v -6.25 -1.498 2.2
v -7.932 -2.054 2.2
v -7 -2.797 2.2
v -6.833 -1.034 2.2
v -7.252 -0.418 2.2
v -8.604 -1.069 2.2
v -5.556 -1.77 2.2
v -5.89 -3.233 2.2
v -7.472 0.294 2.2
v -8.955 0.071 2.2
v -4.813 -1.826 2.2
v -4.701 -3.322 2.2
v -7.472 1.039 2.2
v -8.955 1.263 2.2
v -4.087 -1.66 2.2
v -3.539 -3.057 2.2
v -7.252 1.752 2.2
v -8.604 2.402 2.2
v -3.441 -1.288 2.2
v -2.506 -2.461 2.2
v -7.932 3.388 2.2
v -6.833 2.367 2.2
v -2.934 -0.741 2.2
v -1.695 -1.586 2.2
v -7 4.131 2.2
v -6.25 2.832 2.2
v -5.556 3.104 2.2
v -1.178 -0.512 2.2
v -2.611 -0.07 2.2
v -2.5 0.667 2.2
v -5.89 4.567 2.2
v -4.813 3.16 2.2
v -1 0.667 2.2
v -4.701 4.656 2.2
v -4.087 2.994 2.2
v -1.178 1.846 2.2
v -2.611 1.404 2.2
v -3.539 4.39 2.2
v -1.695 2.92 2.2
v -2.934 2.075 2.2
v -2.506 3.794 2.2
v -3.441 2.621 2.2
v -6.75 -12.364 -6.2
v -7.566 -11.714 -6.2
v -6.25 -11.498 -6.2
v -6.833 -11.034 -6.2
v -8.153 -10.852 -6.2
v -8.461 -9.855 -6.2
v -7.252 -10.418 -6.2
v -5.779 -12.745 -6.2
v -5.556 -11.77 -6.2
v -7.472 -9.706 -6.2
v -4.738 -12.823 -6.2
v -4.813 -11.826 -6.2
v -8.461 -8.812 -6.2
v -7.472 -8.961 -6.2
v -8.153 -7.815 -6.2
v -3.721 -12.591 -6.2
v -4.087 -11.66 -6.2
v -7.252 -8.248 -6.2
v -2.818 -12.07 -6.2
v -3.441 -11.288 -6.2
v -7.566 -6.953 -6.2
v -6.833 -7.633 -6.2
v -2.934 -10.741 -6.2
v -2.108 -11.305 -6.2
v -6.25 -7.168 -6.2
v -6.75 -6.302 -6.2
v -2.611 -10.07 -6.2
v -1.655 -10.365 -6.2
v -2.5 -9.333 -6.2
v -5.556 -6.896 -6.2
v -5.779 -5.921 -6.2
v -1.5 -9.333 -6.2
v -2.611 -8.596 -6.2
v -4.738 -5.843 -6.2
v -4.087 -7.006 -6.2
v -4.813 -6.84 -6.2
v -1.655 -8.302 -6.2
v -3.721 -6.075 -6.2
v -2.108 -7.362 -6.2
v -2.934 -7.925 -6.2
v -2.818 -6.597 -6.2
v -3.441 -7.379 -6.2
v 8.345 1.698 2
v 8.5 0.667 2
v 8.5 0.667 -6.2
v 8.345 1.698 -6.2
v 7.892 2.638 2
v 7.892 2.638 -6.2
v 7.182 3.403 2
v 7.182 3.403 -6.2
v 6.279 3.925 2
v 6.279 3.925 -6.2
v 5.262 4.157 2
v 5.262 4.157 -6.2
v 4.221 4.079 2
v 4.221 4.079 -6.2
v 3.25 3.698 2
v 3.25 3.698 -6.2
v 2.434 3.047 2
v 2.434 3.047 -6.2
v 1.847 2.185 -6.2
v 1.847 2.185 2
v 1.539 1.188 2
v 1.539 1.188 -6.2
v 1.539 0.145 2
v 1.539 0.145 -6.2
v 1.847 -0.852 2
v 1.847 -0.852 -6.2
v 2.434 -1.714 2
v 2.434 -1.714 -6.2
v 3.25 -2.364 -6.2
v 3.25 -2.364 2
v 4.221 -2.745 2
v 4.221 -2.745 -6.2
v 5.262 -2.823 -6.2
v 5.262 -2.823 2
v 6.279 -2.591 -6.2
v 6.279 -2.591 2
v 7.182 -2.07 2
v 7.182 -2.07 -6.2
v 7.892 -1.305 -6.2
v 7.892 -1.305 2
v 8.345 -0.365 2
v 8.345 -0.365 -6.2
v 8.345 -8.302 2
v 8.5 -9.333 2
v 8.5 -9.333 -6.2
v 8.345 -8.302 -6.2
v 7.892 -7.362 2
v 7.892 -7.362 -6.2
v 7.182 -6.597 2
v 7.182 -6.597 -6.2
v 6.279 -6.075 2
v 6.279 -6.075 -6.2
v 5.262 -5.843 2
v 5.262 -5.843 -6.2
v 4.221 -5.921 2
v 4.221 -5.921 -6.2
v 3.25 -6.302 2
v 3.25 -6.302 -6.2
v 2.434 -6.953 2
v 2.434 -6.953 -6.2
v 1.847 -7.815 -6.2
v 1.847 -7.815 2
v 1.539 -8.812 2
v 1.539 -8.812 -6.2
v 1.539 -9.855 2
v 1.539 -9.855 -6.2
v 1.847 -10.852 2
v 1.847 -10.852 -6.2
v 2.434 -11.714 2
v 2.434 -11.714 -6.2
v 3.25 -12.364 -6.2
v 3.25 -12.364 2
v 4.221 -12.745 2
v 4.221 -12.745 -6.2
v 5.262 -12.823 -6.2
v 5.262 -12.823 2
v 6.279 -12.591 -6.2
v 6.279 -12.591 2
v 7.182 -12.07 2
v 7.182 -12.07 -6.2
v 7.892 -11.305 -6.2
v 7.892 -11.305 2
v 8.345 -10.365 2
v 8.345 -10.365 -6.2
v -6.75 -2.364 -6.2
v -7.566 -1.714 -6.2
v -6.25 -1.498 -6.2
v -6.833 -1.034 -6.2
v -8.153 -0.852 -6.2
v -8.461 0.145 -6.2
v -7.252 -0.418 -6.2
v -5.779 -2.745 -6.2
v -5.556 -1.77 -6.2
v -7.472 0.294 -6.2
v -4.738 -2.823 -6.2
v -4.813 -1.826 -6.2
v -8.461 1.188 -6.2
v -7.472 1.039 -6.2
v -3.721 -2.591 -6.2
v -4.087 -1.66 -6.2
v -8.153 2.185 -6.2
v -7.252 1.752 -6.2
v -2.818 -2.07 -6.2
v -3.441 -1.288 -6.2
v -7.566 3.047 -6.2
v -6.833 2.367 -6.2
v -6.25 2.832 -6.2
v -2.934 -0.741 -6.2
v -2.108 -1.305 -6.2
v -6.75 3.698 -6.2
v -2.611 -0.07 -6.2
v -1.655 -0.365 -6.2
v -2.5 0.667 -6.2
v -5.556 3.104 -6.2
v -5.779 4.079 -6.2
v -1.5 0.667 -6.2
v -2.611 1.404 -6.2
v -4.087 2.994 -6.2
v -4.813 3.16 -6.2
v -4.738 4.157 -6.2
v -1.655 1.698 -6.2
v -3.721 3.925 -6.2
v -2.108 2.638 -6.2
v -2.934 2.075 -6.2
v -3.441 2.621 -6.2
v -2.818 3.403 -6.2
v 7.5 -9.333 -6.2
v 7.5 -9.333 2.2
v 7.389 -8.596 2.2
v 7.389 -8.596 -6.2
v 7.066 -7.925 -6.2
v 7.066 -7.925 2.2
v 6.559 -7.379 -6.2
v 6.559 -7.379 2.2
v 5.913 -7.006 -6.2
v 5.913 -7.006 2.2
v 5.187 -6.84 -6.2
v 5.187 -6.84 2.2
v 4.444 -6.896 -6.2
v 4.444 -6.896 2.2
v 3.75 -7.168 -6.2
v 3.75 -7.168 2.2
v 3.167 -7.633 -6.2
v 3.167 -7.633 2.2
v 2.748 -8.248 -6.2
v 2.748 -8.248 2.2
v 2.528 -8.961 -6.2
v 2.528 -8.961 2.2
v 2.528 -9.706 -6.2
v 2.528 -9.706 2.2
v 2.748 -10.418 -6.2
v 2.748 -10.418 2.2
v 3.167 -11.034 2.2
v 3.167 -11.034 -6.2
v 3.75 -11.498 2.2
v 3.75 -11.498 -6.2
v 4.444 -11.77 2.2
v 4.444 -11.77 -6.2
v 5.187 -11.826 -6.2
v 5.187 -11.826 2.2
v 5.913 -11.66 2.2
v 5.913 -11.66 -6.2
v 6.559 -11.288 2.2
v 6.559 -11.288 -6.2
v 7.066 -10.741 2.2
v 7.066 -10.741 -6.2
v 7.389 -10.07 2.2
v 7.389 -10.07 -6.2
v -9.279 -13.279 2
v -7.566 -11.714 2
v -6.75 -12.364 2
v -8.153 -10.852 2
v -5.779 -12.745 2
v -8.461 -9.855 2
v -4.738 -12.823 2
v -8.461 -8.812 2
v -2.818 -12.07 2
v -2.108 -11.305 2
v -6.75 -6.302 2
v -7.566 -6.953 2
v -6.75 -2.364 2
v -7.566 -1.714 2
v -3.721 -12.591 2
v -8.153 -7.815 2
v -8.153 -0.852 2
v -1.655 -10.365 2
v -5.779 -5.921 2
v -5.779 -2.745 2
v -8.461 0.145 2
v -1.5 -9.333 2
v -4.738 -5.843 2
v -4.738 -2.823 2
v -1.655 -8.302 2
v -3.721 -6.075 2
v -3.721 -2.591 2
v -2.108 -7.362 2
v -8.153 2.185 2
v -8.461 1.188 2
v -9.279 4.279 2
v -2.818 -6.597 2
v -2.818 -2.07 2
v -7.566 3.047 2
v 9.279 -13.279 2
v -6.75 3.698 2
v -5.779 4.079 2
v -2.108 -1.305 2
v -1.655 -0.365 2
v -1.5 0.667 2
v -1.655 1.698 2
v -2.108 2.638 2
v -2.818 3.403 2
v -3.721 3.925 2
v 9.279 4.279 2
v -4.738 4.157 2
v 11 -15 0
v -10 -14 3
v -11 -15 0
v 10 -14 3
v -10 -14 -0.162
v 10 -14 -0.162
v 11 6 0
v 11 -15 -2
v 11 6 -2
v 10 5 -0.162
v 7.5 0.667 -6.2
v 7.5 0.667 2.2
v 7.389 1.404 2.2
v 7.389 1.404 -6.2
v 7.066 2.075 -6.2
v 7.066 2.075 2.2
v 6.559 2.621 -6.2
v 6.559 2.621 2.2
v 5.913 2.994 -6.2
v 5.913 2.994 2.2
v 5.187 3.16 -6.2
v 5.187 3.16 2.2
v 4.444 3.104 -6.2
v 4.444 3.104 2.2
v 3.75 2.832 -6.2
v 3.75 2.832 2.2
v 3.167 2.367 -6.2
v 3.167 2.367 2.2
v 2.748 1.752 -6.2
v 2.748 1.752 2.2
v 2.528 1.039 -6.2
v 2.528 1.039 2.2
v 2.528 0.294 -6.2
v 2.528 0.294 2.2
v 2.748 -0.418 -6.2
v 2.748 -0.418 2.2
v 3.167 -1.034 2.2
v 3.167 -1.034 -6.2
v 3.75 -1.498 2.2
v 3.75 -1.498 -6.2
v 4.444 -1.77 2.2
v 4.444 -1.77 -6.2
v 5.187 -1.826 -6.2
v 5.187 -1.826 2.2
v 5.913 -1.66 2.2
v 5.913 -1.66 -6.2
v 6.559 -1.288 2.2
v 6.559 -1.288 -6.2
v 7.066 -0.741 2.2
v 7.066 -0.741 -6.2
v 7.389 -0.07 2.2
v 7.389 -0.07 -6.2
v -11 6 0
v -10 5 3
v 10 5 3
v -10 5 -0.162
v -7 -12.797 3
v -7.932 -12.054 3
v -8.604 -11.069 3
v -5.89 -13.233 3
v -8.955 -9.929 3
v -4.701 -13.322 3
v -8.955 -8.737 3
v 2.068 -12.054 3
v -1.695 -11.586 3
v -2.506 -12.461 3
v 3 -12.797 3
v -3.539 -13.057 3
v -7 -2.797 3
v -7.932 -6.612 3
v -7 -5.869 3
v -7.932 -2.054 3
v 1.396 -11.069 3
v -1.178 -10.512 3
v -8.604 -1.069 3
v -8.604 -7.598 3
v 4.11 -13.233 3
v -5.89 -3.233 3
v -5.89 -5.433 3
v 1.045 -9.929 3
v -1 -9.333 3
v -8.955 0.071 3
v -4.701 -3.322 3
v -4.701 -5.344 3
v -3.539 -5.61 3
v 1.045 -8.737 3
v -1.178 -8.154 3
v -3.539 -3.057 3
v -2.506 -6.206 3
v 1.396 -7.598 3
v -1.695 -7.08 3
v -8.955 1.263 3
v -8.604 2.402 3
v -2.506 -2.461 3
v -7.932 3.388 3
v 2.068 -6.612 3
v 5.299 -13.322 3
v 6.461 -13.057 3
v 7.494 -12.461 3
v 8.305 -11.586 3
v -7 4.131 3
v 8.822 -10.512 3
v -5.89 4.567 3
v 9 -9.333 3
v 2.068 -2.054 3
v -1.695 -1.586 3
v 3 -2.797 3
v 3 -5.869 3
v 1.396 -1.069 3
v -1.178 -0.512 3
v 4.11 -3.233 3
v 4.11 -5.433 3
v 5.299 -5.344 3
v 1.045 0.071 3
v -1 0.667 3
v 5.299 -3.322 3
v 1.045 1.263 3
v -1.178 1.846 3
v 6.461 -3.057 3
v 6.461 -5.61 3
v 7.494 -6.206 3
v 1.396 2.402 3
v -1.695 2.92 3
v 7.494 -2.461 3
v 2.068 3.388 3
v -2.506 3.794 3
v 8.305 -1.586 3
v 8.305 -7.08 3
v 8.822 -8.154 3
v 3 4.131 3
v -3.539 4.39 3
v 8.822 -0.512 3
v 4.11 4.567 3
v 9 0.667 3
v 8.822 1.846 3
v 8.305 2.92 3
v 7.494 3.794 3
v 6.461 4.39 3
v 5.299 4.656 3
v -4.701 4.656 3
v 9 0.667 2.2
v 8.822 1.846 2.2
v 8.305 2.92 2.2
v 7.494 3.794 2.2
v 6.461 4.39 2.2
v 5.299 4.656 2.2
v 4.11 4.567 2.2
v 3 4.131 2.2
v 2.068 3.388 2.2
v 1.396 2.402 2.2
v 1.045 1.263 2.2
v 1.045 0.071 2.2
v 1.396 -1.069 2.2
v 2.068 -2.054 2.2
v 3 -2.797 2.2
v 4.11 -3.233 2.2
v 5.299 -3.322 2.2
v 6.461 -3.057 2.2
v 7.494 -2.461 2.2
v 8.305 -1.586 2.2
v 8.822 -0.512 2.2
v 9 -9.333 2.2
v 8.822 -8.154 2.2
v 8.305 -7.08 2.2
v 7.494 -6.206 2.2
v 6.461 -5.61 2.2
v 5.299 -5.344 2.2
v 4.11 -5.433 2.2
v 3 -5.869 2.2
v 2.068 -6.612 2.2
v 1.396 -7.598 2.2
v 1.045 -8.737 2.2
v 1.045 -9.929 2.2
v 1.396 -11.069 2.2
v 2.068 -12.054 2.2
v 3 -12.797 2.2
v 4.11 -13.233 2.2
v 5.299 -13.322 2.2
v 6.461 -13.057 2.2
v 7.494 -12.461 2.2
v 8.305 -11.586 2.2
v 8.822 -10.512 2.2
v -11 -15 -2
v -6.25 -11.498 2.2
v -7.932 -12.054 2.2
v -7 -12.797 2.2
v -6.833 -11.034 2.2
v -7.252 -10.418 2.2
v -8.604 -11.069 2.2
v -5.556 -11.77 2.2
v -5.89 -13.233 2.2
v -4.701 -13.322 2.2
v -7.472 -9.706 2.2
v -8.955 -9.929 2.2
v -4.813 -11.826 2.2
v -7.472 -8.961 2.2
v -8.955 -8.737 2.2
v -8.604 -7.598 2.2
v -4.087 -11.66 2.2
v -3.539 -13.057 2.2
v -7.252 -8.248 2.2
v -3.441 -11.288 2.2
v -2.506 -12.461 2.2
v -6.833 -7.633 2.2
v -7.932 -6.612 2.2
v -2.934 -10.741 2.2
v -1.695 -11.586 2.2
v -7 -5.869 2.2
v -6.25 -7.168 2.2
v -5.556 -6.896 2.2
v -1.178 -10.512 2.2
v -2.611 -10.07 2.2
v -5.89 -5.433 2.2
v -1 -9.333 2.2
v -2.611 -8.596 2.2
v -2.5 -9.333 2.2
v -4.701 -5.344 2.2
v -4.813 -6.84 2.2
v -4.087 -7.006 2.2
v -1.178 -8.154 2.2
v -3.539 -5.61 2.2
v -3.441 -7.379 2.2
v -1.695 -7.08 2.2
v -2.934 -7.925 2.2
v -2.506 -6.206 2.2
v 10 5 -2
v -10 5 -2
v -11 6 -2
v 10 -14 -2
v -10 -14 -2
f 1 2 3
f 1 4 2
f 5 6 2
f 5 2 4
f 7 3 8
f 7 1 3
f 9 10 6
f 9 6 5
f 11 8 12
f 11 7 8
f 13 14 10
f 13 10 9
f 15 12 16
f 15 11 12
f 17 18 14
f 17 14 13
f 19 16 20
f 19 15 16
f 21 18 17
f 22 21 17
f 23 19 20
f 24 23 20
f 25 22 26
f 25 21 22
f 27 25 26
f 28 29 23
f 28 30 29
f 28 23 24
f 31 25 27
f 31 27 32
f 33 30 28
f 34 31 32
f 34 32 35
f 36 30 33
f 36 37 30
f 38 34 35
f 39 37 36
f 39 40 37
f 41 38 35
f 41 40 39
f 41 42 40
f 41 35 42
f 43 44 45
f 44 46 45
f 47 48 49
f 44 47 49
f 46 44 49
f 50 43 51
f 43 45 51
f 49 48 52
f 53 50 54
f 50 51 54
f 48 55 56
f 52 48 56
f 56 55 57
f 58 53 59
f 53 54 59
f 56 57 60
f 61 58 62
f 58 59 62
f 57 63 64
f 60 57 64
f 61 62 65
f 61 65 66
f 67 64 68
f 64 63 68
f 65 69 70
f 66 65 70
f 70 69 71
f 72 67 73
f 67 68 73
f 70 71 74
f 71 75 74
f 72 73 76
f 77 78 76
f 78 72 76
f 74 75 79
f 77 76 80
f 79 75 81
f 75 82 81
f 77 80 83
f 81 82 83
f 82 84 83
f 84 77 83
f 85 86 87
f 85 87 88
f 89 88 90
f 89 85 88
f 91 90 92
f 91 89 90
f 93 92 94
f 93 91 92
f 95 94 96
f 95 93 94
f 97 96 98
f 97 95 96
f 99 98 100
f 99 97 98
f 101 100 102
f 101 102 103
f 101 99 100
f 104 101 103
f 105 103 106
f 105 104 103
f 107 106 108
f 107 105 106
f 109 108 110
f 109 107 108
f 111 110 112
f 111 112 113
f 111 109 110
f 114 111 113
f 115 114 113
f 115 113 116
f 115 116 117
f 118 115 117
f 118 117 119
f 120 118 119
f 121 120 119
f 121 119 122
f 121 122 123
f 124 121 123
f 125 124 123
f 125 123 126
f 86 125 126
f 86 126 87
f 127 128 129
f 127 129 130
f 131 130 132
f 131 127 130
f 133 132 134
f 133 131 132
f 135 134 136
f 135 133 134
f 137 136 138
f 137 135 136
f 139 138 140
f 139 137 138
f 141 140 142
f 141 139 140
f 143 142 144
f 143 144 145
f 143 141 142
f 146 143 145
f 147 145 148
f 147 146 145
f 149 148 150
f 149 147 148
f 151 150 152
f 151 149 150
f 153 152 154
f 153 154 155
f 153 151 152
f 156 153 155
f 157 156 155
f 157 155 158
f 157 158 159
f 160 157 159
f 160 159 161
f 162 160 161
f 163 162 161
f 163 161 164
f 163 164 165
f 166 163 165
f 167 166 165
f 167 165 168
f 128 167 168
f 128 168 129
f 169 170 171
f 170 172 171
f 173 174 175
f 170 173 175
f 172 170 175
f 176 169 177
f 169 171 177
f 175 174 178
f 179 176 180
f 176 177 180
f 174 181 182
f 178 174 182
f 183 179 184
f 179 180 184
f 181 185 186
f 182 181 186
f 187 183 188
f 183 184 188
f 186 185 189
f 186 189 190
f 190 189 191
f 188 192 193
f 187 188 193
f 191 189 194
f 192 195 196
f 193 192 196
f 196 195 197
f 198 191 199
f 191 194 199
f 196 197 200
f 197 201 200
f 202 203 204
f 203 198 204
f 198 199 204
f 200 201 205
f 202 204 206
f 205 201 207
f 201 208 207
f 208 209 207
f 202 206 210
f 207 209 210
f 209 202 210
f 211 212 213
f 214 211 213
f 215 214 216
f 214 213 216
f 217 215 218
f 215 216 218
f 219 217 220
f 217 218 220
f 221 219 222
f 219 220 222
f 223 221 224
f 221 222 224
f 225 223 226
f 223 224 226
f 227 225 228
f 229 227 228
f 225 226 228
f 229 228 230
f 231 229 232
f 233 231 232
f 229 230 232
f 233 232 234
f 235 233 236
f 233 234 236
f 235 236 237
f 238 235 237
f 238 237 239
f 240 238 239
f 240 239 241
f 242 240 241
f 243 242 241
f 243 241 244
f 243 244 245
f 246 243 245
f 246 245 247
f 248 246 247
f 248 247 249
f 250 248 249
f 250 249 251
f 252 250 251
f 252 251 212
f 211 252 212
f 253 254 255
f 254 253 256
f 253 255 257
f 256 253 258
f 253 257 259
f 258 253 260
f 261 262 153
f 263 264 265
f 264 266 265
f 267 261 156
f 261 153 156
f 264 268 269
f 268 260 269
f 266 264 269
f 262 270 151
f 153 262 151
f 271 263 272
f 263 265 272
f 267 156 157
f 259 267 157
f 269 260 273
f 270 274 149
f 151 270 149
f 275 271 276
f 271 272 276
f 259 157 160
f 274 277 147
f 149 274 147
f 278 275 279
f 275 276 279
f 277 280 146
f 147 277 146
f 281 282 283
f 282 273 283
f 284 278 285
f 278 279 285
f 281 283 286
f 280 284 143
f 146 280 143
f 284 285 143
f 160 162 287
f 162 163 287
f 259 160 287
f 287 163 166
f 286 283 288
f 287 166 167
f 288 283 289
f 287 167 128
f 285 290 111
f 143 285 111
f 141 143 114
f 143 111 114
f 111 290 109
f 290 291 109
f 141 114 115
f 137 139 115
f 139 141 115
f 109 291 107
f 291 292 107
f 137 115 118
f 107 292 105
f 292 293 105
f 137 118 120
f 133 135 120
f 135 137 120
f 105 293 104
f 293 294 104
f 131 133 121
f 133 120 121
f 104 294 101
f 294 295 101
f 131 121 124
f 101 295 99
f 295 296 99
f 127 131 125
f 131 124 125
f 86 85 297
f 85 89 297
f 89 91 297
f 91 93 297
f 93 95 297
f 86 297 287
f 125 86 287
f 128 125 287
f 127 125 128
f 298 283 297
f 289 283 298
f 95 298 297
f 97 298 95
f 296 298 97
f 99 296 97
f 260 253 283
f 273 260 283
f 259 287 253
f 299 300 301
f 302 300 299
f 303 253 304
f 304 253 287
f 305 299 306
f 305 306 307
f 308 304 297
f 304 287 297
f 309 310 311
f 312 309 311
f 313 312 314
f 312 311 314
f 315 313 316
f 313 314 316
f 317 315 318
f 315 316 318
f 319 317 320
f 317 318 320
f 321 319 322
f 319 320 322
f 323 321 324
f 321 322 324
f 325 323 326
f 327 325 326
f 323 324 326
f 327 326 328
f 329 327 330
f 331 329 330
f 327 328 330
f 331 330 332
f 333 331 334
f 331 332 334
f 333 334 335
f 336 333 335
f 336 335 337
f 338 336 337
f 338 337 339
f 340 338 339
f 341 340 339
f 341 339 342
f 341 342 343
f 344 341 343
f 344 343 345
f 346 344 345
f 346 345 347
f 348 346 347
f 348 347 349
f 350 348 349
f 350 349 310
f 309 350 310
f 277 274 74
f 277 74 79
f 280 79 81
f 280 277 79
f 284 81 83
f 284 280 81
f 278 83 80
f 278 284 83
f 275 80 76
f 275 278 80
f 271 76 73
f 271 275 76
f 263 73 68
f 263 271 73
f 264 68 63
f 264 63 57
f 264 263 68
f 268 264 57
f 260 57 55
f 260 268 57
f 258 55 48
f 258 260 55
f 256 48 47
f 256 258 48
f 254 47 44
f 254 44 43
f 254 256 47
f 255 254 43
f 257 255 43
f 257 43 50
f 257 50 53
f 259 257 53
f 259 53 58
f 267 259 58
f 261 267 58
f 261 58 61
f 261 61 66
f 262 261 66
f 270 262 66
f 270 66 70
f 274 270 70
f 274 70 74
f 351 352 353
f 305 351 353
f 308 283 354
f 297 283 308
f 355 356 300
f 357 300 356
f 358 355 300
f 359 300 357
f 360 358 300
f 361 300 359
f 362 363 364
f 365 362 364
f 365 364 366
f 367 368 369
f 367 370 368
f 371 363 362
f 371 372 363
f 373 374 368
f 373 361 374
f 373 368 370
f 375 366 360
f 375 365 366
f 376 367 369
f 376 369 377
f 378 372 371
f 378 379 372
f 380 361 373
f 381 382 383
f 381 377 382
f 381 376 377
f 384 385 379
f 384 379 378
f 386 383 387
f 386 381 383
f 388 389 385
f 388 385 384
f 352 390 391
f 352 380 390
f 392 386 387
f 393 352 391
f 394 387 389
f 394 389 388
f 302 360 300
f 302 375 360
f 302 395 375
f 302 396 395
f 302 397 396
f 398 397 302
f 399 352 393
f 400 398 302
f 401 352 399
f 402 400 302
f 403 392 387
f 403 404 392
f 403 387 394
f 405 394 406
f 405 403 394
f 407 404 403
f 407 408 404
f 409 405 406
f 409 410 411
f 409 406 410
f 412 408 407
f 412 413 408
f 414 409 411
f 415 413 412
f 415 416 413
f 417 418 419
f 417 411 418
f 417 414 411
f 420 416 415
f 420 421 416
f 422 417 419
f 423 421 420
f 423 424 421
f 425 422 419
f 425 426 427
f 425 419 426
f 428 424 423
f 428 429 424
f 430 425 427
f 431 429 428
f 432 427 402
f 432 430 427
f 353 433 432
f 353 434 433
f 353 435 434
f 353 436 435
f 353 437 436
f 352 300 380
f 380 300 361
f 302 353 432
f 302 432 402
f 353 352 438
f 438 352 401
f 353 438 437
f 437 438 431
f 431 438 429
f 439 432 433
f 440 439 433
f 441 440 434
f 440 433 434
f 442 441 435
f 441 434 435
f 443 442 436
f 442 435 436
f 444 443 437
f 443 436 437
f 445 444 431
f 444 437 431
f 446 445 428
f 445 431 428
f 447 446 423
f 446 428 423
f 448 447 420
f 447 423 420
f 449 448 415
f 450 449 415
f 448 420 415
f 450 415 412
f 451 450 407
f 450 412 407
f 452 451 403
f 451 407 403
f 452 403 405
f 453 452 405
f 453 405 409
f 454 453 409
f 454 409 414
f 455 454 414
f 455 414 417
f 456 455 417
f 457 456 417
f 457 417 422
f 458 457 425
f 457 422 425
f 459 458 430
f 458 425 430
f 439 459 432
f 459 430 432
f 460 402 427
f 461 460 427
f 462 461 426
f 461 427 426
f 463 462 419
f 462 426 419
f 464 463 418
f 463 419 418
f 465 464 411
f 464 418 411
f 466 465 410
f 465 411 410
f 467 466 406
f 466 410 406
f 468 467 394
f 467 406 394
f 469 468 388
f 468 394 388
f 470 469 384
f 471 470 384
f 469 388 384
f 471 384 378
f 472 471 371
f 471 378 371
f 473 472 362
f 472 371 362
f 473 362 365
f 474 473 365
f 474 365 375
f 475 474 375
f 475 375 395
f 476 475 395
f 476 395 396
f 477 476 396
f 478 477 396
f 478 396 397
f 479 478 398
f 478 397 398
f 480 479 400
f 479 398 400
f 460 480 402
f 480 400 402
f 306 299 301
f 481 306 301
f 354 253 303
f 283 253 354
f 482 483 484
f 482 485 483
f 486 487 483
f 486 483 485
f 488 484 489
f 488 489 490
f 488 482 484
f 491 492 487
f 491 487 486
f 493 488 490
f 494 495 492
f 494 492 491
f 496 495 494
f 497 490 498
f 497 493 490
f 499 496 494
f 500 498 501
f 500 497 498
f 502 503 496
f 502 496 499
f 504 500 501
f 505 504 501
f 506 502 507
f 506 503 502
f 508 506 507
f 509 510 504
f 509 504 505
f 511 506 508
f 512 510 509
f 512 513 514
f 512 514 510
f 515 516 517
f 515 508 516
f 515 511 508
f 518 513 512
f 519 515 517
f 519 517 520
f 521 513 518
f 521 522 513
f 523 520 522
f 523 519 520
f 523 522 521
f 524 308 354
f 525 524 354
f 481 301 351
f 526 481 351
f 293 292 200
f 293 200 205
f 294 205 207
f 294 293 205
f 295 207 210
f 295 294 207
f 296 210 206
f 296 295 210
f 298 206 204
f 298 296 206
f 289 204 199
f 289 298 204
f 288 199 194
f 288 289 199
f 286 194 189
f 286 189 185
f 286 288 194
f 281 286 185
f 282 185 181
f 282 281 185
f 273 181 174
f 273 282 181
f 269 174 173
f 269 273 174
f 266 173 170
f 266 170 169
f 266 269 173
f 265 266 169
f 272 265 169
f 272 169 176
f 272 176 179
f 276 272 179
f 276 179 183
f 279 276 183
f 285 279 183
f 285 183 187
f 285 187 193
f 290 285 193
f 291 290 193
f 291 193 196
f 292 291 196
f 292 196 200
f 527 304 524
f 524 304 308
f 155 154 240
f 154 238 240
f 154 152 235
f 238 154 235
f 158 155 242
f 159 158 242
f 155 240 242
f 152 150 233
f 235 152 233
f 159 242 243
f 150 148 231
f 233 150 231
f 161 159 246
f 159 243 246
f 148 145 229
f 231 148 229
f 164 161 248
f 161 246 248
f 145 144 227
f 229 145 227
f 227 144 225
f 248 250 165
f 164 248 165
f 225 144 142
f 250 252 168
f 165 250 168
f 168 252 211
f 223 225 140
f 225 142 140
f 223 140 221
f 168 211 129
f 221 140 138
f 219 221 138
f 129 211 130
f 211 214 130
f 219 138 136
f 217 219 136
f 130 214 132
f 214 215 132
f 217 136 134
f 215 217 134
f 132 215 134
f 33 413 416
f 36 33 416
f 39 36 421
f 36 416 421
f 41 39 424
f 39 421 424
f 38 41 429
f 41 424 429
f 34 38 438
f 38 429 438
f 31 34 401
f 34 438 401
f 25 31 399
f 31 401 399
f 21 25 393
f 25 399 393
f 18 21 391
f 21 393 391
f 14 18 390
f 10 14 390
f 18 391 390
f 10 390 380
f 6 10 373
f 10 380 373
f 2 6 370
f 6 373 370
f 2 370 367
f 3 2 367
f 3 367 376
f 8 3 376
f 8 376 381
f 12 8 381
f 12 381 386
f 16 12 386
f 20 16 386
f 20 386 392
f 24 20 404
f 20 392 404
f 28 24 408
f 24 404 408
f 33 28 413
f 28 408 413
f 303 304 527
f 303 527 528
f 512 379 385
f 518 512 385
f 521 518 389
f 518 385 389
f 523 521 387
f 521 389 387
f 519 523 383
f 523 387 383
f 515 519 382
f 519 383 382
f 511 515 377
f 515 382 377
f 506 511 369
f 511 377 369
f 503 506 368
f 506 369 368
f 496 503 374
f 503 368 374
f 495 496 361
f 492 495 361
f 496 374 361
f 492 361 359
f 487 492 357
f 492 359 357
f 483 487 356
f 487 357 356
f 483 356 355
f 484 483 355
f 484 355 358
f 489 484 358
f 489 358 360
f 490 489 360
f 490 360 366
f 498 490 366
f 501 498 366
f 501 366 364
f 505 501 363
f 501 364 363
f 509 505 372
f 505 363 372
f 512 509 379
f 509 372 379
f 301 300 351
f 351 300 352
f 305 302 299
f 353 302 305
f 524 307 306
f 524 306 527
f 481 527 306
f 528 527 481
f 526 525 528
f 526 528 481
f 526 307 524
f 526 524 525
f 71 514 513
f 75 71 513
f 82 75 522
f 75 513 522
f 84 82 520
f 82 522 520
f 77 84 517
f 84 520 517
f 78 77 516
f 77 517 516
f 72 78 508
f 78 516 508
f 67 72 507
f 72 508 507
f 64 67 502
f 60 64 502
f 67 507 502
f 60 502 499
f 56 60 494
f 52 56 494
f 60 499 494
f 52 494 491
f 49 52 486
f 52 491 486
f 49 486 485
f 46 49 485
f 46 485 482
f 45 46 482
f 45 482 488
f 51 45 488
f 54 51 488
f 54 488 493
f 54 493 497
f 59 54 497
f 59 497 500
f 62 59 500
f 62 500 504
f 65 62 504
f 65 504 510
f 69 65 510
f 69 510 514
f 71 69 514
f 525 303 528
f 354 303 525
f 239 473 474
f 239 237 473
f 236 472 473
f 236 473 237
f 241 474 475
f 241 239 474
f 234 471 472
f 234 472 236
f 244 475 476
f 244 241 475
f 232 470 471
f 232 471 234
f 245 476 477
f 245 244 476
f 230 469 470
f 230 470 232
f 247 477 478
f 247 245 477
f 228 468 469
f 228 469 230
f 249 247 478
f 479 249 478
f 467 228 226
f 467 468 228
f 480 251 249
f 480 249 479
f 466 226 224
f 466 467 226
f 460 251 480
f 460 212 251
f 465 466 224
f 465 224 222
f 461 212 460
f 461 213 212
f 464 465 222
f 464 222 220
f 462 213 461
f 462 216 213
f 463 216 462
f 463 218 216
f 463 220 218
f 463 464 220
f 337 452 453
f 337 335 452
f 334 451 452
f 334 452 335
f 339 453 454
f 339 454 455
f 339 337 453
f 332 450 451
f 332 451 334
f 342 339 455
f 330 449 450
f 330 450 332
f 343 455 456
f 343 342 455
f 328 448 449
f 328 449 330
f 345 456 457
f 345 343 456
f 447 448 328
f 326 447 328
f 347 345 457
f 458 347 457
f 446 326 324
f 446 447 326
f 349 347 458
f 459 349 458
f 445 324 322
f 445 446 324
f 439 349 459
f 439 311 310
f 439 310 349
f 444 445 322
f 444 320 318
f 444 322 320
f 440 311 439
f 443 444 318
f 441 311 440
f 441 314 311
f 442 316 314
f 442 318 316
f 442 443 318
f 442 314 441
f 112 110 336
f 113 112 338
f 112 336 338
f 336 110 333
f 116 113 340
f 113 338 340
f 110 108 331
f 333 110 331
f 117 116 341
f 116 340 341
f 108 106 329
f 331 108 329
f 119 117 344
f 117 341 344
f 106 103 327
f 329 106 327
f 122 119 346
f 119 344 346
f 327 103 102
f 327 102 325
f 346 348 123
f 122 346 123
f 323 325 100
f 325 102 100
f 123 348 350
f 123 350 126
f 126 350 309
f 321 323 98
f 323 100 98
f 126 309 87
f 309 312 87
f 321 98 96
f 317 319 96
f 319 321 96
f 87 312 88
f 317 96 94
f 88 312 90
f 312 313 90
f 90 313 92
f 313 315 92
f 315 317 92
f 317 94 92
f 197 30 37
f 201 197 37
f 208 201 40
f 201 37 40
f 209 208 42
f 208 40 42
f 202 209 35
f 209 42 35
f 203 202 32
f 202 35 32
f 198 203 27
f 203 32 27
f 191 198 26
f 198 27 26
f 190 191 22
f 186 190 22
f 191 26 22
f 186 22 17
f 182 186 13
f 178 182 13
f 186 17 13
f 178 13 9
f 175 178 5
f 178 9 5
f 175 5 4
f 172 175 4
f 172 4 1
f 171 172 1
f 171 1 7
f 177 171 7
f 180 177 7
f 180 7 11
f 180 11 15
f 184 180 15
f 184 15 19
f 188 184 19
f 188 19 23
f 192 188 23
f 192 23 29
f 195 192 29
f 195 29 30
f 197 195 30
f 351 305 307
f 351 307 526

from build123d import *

# Parameters (mm, degrees)
LOFT6_OUTLINE_W     = 20
LOFT6_OUTLINE_H     = 19
LOFT6_DEPTH         = 3
LOFT6_DRAFT         = 18.4349488
SKETCH4_W           = 22
SKETCH4_H           = 21
BOSS_EXTRUDE1_DEPTH = 2
SHELL1_T            = -1
SKETCH5_R           = 3.5
SKETCH5_R_2         = 2.5
BOSS_EXTRUDE2_DEPTH = 9.2
SKETCH5_2_R         = 2.5
CUT_EXTRUDE1_DEPTH  = 9.2
SKETCH6_R           = 4
SKETCH6_R_2         = 2.5
CUT_EXTRUDE3_DEPTH  = 0.8


# Read off the part's stored shape, not the designer's step: Loft6
with BuildPart() as part:
    # Loft6 outline → Loft6 (with draft: the straight prism first)
    with BuildSketch(Plane.XY.offset(3)):
        with Locations((0, -4.5)):
            Rectangle(LOFT6_OUTLINE_W, LOFT6_OUTLINE_H)
    extrude(amount=-LOFT6_DEPTH)
    # Loft6: the draft: its side faces are tilted about the plane it starts from
    loft6_sides = [part.faces().sort_by_distance(p)[0] for p in [
        (10, -4.5, 1.5),
        (0, 5, 1.5),
        (-10, -4.5, 1.5),
        (0, -14, 1.5),
    ]]
    draft(loft6_sides, Plane.XY.offset(3), LOFT6_DRAFT)

    # Sketch4 → Boss-Extrude1 (add)
    with BuildSketch(Plane(origin=(0, 0, 0), x_dir=(-1, 0, 0), z_dir=(0, 0, -1))):
        with Locations((0, -4.5)):
            Rectangle(SKETCH4_W, SKETCH4_H)
    extrude(amount=BOSS_EXTRUDE1_DEPTH)

    # Shell1
    shell1_openings = [part.faces().sort_by_distance(p)[0] for p in [
        (0, -4.5, -2),
    ]]
    offset(amount=SHELL1_T, openings=shell1_openings, kind=Kind.INTERSECTION)

    # Sketch5 → Boss-Extrude2 (add)
    # profile 1 of 4: a face of its own
    with BuildSketch(Plane.XY.offset(3)):
        with Locations((-5, 0.666820713)):
            Circle(SKETCH5_R)
        with Locations((-5, 0.666820713)):
            Circle(SKETCH5_R_2, mode=Mode.SUBTRACT)
    # profile 2 of 4: a face of its own
    with BuildSketch(Plane.XY.offset(3)):
        with Locations((5, 0.666820713)):
            Circle(SKETCH5_R)
        with Locations((5, 0.666820713)):
            Circle(SKETCH5_R_2, mode=Mode.SUBTRACT)
    # profile 3 of 4: a face of its own
    with BuildSketch(Plane.XY.offset(3)):
        with Locations((-5, -9.333179287)):
            Circle(SKETCH5_R)
        with Locations((-5, -9.333179287)):
            Circle(SKETCH5_R_2, mode=Mode.SUBTRACT)
    # profile 4 of 4: a face of its own
    with BuildSketch(Plane.XY.offset(3)):
        with Locations((5, -9.333179287)):
            Circle(SKETCH5_R)
        with Locations((5, -9.333179287)):
            Circle(SKETCH5_R_2, mode=Mode.SUBTRACT)
    extrude(amount=-BOSS_EXTRUDE2_DEPTH)

    # Sketch5<2> → Cut-Extrude1 (cut)
    with BuildSketch(Plane.XY.offset(3)):
        with Locations((-5, 0.666820713)):
            Circle(SKETCH5_2_R)
        with Locations((5, 0.666820713)):
            Circle(SKETCH5_2_R)
        with Locations((5, -9.333179287)):
            Circle(SKETCH5_2_R)
        with Locations((-5, -9.333179287)):
            Circle(SKETCH5_2_R)
    extrude(amount=-CUT_EXTRUDE1_DEPTH, mode=Mode.SUBTRACT)

    # Sketch6 → Cut-Extrude3 (cut)
    # profile 1 of 4: a face of its own
    with BuildSketch(Plane.XY.offset(3)):
        with Locations((-5, 0.666820713)):
            Circle(SKETCH6_R)
        with Locations((-5, 0.666820713)):
            Circle(SKETCH6_R_2, mode=Mode.SUBTRACT)
    # profile 2 of 4: a face of its own
    with BuildSketch(Plane.XY.offset(3)):
        with Locations((5, 0.666820713)):
            Circle(SKETCH6_R)
        with Locations((5, 0.666820713)):
            Circle(SKETCH6_R_2, mode=Mode.SUBTRACT)
    # profile 3 of 4: a face of its own
    with BuildSketch(Plane.XY.offset(3)):
        with Locations((5, -9.333179287)):
            Circle(SKETCH6_R)
        with Locations((5, -9.333179287)):
            Circle(SKETCH6_R_2, mode=Mode.SUBTRACT)
    # profile 4 of 4: a face of its own
    with BuildSketch(Plane.XY.offset(3)):
        with Locations((-5, -9.333179287)):
            Circle(SKETCH6_R)
        with Locations((-5, -9.333179287)):
            Circle(SKETCH6_R_2, mode=Mode.SUBTRACT)
    extrude(amount=-CUT_EXTRUDE3_DEPTH, mode=Mode.SUBTRACT)


solid = part.part
